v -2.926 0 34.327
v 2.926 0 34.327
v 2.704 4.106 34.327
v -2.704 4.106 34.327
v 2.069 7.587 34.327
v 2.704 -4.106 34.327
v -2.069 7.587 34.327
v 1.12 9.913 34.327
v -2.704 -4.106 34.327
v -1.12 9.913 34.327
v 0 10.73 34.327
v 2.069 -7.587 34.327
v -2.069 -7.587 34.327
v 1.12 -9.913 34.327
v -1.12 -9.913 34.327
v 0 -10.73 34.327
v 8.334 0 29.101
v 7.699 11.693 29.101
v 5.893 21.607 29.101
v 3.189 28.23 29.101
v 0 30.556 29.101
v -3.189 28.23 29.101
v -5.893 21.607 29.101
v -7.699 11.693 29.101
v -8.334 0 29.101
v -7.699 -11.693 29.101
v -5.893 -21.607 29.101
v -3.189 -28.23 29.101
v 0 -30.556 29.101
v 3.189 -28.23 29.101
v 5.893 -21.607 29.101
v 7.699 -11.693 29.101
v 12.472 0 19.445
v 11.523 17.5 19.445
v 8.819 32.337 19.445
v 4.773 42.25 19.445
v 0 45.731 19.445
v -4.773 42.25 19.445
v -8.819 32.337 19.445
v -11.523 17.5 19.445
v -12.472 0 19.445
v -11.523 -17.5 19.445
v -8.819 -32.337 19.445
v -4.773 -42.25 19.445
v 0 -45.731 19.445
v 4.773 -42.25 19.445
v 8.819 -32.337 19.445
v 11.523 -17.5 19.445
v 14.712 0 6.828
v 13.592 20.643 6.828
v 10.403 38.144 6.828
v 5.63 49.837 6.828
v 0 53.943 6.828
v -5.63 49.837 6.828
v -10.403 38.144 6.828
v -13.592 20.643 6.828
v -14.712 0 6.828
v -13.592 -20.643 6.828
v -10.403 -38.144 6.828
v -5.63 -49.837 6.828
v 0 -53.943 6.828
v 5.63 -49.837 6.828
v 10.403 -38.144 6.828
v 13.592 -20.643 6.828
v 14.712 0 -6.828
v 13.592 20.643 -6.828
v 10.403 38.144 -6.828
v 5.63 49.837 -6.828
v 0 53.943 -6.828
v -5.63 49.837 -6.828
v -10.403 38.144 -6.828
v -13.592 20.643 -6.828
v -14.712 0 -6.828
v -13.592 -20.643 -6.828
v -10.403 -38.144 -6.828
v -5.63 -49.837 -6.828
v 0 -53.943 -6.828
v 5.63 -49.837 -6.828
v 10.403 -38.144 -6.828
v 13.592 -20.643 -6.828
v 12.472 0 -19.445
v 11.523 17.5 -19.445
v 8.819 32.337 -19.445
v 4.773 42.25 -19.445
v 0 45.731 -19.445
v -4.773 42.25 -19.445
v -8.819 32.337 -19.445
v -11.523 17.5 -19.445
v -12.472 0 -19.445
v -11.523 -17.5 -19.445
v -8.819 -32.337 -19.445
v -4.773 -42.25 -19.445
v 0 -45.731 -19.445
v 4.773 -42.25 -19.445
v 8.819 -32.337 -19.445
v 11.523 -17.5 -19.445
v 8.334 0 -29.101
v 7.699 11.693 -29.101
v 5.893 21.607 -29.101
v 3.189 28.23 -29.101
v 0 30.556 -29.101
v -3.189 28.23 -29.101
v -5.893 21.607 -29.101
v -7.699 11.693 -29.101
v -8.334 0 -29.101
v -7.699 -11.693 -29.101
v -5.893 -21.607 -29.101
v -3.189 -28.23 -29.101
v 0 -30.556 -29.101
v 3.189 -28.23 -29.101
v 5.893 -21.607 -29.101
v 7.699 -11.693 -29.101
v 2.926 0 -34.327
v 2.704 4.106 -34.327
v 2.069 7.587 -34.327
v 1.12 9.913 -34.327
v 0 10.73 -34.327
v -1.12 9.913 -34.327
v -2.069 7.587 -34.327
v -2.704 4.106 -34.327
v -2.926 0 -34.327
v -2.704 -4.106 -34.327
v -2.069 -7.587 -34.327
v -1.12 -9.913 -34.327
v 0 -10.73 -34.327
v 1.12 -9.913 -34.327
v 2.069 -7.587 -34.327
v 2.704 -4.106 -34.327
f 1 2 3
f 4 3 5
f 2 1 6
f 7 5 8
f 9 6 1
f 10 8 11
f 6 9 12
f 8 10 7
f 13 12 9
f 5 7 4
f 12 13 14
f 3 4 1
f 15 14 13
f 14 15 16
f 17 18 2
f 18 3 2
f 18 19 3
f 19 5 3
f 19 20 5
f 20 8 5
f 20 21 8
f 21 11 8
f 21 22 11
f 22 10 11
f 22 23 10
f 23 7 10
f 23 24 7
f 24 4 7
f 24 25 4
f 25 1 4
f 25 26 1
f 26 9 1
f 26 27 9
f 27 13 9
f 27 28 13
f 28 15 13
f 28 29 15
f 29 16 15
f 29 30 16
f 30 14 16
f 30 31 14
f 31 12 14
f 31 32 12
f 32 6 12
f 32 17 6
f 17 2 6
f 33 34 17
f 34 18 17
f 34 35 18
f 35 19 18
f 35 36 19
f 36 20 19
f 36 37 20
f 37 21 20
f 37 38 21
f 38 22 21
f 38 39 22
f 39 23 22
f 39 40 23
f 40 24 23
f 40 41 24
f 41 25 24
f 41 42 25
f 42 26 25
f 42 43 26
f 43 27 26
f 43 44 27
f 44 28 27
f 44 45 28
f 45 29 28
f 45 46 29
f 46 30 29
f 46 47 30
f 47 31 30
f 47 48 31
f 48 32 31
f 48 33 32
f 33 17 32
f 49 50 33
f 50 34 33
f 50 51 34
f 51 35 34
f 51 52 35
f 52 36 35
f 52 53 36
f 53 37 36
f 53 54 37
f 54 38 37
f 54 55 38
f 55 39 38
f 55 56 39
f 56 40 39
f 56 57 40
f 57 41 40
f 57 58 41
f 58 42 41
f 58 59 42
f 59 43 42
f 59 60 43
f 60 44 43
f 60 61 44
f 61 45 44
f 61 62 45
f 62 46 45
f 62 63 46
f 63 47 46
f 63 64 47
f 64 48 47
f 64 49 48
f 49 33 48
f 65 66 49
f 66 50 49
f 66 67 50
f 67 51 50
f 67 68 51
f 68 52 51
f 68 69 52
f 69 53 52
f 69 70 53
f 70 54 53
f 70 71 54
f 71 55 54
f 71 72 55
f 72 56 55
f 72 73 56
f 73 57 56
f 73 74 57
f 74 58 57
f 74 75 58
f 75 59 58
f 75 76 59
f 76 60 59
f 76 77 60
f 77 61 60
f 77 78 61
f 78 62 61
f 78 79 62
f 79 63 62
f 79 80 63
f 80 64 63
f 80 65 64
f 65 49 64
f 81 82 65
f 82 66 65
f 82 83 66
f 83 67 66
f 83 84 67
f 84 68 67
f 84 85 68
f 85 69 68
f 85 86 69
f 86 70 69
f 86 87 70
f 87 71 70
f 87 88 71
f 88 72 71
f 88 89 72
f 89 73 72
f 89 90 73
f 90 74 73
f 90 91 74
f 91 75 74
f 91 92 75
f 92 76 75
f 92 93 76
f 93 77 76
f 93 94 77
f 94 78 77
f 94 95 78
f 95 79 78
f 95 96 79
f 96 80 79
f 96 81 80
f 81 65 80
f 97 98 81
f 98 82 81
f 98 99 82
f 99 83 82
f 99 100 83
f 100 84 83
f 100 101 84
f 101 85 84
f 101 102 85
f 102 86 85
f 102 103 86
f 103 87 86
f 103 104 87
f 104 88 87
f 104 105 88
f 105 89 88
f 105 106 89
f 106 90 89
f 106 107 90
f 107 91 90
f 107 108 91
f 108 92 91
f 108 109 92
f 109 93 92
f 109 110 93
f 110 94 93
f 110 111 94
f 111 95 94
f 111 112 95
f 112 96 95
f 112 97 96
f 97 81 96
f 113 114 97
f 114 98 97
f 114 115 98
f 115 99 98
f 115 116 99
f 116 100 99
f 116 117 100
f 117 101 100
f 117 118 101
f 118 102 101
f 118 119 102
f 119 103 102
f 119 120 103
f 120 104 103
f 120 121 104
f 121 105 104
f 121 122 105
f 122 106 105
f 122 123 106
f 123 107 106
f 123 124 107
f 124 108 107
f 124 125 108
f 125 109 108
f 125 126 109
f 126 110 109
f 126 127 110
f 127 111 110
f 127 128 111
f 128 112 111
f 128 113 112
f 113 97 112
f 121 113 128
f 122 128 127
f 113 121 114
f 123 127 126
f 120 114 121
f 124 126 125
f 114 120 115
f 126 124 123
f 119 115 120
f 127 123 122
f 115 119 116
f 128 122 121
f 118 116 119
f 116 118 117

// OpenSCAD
// Generated by SolidPython 1.0.1 on 2020-07-29 00:46:45


scale(v = [3, 11, 7]) {
	sphere(r = 5);
}
/***********************************************
*********      SolidPython code:      **********
************************************************
 
# import packages: SolidPython
from solid import *
from solid.utils import *
from itertools import chain, combinations, permutations


class Resize:

    def __init__(self, scad_file):
        self.scad_file = scad_file
        #self.scad_file = import_scad(scad_file)
        # cone/cylinder param:
        self.r1 = 0
        self.r2 = 0
        self.h = 0
        # rectangular prism param:
        self.w = 0
        self.l = 0
        # ellipse param:
        self.r = 0

    # import OpenScad code (file name corresponds to shape)


    # classify shape + parameters
    def assign(self, param1, param2, param3):
        if self.scad_file == 'cone.scad':
            self.r1 = param1
            self.r2 = param2
            self.h = param3
        elif self.scad_file == 'cylinder.scad':
            self.r1 = param1
            self.r2 = param2
            self.h = param3
        elif self.scad_file == 'rectangularPrism.scad':
            self.h = param1
            self.l = param2
            self.w = param3
        else:
            self.r = param1
            self.h = param2

    # resize parameters
    def iterate(self):
        x = range(3, 20, 2)
        i = 1
        if self.scad_file == 'cone.scad':
            tempList = list(permutations(x, 2))
            for temp in tempList:
                param1 = temp[0]
                param2 = temp[1]
                filepath = 'produced_scad_files/' + 'cone' + str(param1) + '_' + str(param2) + '_' + '.scad'
                scad_render_to_file(cylinder(h=param1, r1=param2, r2=0), filepath)

        elif self.scad_file == 'cylinder.scad':
            tempList = list(permutations(x, 3))
            for temp in tempList:
                param1 = temp[0]
                param2 = temp[1]
                filepath = 'produced_scad_files/' + 'cylinder' + str(param1) + '_' + str(param2) + '_' + '.scad'
                scad_render_to_file(cylinder(h=param1, r1=param2, r2=param2), filepath)

        elif self.scad_file == 'rectangularPrism.scad':
            tempList = list(permutations(x, 3))
            for temp in tempList:
                param1 = temp[0]
                param2 = temp[1]
                param3 = temp[2]
                filepath = 'produced_scad_files/' + 'rectangularPrism' + str(param1) + '_' + str(param2) + '_' + str(
                    param3) + '.scad'
                scad_render_to_file(cube(size=(param1, param2, param3)), filepath)

        elif self.scad_file == 'ellipse.scad':
            tempList = list(permutations(x, 4))
            for temp in tempList:
                param1 = temp[0]
                param2 = temp[1]
                param3 = temp[2]
                param4 = temp[3]
                filepath = 'produced_scad_files/' + 'ellipse' + str(param1) + '_' + str(param2) + '_' + str(param3) + '_' + str(param4) + '.scad'
                scad_render_to_file(scale([param1, param2, param3])(sphere(r=param4)), filepath)

    def render_to_scadfile(self):
        scad_render_to_file(scad, 'example.scad') 
 
************************************************/
